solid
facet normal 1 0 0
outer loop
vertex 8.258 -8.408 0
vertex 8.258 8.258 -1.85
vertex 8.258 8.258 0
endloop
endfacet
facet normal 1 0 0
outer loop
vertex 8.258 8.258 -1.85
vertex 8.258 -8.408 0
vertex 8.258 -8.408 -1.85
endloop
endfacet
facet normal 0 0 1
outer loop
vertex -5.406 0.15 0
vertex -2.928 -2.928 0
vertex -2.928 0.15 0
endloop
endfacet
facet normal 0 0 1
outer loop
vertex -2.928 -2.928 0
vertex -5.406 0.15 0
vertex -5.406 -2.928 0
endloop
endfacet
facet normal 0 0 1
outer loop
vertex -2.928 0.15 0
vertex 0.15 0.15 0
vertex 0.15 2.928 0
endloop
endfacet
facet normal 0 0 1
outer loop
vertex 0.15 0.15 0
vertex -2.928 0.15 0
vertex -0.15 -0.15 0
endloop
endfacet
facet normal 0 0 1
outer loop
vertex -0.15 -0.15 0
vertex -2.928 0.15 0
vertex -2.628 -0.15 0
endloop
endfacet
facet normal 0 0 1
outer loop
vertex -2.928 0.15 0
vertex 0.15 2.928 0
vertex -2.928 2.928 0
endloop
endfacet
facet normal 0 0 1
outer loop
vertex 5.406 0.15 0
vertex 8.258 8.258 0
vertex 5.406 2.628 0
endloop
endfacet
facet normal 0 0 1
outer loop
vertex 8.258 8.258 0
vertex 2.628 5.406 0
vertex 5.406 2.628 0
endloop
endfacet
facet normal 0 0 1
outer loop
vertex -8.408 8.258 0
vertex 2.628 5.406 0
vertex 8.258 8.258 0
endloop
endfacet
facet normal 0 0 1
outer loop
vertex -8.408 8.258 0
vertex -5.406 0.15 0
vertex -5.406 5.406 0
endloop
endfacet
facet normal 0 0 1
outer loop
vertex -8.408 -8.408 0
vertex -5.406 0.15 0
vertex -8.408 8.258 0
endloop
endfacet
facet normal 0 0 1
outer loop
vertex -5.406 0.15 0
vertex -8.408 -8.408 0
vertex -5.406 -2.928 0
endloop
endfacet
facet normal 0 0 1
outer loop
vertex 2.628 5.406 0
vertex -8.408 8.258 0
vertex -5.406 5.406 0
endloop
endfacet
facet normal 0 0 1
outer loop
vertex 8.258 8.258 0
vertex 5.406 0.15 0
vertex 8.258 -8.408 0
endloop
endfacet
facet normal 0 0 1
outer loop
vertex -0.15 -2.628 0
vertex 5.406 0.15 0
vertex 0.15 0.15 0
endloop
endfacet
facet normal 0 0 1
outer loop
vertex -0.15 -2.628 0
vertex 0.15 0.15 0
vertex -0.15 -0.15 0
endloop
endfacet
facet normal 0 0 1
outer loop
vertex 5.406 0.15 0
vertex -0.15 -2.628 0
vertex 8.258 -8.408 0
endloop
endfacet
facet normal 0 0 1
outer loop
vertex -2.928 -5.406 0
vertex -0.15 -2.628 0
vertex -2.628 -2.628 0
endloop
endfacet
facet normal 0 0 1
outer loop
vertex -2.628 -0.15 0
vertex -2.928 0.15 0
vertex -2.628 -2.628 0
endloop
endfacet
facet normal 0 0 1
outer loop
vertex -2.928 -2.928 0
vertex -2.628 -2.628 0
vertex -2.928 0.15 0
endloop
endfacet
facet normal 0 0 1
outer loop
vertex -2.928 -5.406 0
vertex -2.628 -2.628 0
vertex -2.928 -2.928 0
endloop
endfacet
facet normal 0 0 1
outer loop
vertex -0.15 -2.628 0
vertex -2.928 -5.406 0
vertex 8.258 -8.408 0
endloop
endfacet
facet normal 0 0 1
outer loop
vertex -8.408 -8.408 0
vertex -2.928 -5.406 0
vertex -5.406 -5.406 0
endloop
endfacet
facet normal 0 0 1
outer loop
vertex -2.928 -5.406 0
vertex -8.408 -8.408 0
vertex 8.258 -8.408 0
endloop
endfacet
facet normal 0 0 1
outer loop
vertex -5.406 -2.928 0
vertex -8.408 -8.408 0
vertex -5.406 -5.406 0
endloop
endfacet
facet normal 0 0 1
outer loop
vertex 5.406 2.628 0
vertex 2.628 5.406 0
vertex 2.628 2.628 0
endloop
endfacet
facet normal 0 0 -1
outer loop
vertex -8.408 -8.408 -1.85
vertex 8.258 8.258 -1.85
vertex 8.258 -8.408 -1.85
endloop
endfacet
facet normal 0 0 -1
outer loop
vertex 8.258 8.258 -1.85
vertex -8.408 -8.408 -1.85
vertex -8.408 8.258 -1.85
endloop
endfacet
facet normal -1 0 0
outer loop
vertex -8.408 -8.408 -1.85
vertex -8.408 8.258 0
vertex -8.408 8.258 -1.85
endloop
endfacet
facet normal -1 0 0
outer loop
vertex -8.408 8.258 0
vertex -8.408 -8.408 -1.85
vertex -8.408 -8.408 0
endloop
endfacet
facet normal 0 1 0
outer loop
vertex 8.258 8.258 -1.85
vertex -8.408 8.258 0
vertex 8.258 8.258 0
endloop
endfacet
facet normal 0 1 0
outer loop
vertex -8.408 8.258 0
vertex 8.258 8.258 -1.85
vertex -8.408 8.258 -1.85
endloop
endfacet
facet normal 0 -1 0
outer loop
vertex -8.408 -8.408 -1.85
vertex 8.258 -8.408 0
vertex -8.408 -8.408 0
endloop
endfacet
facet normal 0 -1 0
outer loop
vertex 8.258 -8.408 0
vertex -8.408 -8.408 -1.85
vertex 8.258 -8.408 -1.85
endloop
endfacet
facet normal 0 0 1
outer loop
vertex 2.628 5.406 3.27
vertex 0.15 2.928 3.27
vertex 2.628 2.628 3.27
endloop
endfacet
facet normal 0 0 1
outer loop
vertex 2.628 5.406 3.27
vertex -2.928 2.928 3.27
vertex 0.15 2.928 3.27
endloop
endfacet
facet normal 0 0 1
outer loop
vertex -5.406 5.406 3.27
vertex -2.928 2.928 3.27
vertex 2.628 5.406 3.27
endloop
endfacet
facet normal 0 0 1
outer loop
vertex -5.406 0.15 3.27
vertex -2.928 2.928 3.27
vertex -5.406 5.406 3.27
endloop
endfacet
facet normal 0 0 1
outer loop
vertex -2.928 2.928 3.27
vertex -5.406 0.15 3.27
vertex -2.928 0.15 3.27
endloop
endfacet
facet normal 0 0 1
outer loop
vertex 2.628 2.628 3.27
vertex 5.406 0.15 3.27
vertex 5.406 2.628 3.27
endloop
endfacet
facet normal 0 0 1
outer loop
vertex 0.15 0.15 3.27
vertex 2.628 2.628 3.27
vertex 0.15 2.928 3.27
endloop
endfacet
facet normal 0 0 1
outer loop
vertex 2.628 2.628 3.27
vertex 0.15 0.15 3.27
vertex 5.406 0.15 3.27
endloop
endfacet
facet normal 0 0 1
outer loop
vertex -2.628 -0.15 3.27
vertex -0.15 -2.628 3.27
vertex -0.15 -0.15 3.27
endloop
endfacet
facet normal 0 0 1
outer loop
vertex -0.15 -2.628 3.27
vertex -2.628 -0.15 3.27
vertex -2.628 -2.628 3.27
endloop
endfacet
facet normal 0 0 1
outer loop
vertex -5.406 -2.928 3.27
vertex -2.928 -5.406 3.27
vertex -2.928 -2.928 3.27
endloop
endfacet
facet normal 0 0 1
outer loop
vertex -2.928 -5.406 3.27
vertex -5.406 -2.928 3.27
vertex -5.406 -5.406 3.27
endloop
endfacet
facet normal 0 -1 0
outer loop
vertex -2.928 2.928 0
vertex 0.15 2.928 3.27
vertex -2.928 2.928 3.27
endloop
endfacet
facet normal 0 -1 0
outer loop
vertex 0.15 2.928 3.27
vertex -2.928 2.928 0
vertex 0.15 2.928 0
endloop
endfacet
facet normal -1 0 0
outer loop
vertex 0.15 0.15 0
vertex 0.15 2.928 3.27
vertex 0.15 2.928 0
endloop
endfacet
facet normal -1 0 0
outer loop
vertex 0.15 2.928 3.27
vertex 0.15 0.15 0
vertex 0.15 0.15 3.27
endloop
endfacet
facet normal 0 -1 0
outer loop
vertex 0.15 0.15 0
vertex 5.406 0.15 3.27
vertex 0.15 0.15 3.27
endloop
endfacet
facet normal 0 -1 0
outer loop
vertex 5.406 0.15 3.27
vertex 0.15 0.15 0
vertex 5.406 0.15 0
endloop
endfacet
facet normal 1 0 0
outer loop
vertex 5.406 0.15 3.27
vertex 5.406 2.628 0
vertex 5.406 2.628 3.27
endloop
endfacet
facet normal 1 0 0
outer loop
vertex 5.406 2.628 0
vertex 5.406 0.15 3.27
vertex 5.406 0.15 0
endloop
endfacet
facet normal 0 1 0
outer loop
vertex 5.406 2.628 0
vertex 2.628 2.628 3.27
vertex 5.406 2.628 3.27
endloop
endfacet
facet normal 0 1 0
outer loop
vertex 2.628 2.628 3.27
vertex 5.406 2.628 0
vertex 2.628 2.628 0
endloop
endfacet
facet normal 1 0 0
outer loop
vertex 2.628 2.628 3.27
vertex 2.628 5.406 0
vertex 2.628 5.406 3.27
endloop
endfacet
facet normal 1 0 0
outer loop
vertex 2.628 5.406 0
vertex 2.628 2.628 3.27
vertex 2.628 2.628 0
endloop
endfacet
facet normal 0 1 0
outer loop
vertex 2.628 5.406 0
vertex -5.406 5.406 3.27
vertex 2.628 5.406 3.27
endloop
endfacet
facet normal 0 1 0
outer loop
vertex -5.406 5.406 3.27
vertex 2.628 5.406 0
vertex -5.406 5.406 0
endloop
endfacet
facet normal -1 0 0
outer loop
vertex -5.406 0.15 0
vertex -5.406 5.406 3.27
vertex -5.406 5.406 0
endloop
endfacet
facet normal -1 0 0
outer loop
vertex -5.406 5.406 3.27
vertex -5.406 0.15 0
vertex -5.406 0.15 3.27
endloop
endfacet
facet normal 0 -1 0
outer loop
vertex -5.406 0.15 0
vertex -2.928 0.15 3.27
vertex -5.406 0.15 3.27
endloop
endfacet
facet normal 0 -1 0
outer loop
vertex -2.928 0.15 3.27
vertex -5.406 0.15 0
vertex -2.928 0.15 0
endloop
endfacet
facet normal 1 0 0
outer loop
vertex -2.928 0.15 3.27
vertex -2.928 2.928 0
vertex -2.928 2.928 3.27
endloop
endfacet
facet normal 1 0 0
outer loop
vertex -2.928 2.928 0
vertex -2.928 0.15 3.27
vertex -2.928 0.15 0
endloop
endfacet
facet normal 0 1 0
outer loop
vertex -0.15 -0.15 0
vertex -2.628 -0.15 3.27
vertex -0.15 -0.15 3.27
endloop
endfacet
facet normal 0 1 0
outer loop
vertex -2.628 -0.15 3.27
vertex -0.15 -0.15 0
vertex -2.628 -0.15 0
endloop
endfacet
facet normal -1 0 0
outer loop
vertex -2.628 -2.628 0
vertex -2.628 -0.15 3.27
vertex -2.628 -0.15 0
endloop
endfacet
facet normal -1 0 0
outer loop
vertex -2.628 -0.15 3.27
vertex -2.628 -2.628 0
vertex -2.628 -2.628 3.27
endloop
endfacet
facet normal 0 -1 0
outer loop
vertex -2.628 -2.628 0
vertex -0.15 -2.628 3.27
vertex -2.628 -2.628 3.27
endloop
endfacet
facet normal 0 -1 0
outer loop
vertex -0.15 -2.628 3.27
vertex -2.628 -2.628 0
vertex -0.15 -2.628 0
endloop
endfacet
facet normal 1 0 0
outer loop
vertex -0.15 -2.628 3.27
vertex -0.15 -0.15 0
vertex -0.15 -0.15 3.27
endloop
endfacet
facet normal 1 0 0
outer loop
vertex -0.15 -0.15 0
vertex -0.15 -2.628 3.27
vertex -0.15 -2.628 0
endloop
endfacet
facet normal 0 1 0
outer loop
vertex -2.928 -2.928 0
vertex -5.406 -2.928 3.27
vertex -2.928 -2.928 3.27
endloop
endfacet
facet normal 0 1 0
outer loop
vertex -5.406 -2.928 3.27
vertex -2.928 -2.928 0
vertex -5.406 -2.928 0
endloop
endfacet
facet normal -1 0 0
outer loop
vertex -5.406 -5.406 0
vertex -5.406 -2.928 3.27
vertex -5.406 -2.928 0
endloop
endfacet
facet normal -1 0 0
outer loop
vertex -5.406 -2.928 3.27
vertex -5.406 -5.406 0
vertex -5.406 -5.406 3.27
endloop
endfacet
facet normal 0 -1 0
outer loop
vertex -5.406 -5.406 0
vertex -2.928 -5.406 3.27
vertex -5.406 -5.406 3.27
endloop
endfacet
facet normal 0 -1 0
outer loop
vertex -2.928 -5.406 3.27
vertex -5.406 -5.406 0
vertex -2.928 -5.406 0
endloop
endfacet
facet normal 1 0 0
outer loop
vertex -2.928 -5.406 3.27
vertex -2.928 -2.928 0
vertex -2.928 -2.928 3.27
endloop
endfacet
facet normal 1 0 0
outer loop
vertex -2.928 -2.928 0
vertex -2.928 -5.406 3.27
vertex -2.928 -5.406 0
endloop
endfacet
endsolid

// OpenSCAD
diameter = 50;
aruco_data_height= 3;
tol = 0.15;
white_cube_face_height = 2;

/////////////////////////// no touching
radius = diameter/2;
cw = radius/9;
/////////////////////////// cli variables
dodecahedron_export = 0;
aruco_export_all = 0;
aruco_number = 0;
color_to_export = 0;

aruco_data = [
// 0
[
[0, 1, 0, 0],
[1, 0, 1, 0],
[1, 1, 0, 0],
[1, 1, 0, 1],
],
// 1
[
[1, 1, 1, 1],
[0, 0, 0, 0],
[0, 1, 1, 0],
[0, 1, 0, 1],
],
// 2
[
[1, 1, 0, 0],
[1, 1, 0, 0],
[1, 1, 0, 1],
[0, 0, 1, 0],
],
// 3
[
[0, 1, 1, 0],
[0, 1, 1, 0],
[1, 0, 1, 1],
[1, 0, 0, 1],
],
// 4
[
[1, 0, 1, 0],
[1, 0, 1, 1],
[0, 1, 1, 0],
[0, 0, 0, 1],
],
// 5
[
[1, 0, 0, 0],
[0, 1, 1, 0],
[0, 0, 1, 1],
[0, 0, 1, 0],
],
// 6
[
[0, 1, 1, 0],
[0, 0, 0, 1],
[1, 1, 0, 1],
[0, 0, 0, 1],
],
// 7
[
[0, 0, 1, 1],
[1, 0, 1, 1],
[0, 0, 0, 0],
[1, 1, 0, 1],
],
// 8
[
[0, 0, 0, 0],
[0, 0, 0, 1],
[0, 0, 1, 0],
[0, 1, 0, 1],
],
// 9
[
[0, 0, 1, 1],
[0, 0, 0, 0],
[1, 0, 1, 0],
[1, 0, 0, 1],
],
// 10
[
[0, 0, 0, 0],
[0, 1, 1, 0],
[0, 1, 1, 0],
[1, 1, 1, 0],
],
// 11
[
[1, 1, 1, 0],
[1, 1, 1, 0],
[0, 1, 0, 1],
[1, 0, 0, 0],
],
];


module dodecahedron(height) {
	scale([height,height,height])
	{
		intersection(){
			cube([2,2,1], center = true); 
			intersection_for(i=[0:4]){ 
				rotate([0,0,72*i]) rotate([116.565,0,0]) cube([2,2,1], center=true); 
			}
		}
	}
}

module aruco_content(black_cube, row, col, color=1, flat=0){
    if (black_cube == color){
        translate([cw*(row+1), cw*(col+1)])
        if (flat==0) cube([cw, cw, aruco_data_height]);
        else square([cw,cw]);
    }
}

module aruco_borders(){
    difference(){
        cube([cw*(4+2), cw*(4+2), aruco_data_height]); // must fit in face_intrusion
        translate([cw, cw]) cube([cw*4, cw*4, aruco_data_height]);
    }
}

module aruco(data, color=1, flat=0, ) {
    // data is matrix. 1 is black and 0 is white
    // translate([-cw*(4+2)/2, -cw*(4+2)/2, -aruco_data_height/2]){  // if printed with dodecahedron
    translate([-cw*(4+2)/2, -cw*(4+2)/2, 0]){
        if (color==1) {
            aruco_borders();
        }
        
        idx = [0:3];
        for(row = idx) {
            for(col = idx){
                aruco_content(data[row][col], row, col, color=color, flat=flat);
            }
        }
    }
}

module face_intrusion() {
    translate([-(cw*(4+2)+tol)/2, -(cw*(4+2)+tol)/2, -(aruco_data_height+white_cube_face_height+tol)])
    cube([cw*(4+2)+tol, cw*(4+2)+tol, 2*(aruco_data_height+white_cube_face_height+tol)]); // must contain aruco_borders
}


module face_intrude() {
    t_length = radius-aruco_data_height/2+1;
    for(i=[0:4]){
        rotate([0,0,72*i]) rotate([116.565,0,0]) translate([0, 0, t_length]) face_intrusion();
        rotate([0,0,72*i]) rotate([116.565,0,0]) translate([0, 0, -t_length]) face_intrusion();
    }
    translate([0, 0, t_length]) face_intrusion();
    translate([0, 0, -t_length]) face_intrusion();
}

module white_part(data) {
    translate([-(cw*(4+2)+tol)/2, -(cw*(4+2)+tol)/2, -(white_cube_face_height-tol)])
    cube([cw*(4+2), cw*(4+2), white_cube_face_height-tol]); // must contain aruco_borders

    linear_extrude(height=aruco_data_height+0.27) offset(delta=-tol) aruco(data, color=0, flat=1);
}

module black_part(data) {
    aruco(data, color=1);
}

// dodecahedron
if (dodecahedron_export==1){
   
    difference(){
        difference(){
            dodecahedron(diameter);
            face_intrude();
        }
        // stylus hole
        rotate([116.565/3,0,0]) cylinder(h=diameter/1.5, r1=3, r2=4.6);
    }
}


else if (aruco_export_all==1) {
    translate([diameter, -(diameter*2), -radius + (aruco_data_height/2)])
    for(i = [0:11]) {
        if (i<5) {
            translate([0, i*cw*(4+2+1)+50]) black_part(aruco_data[i]);  // black
            translate([40, i*cw*(4+2+1)+50]) white_part(aruco_data[i]);  // white

        }
        else {
            translate([20, (i-5)*cw*(4+2+1)+40]) black_part(aruco_data[i]);  // black
            translate([20+40, (i-5)*cw*(4+2+1)+40]) white_part(aruco_data[i]);  // white
        }
    }
}
else {
    echo(aruco_number);
    if (color_to_export==0) {white_part(aruco_data[aruco_number]);}
    else {black_part(aruco_data[aruco_number]);}
}
